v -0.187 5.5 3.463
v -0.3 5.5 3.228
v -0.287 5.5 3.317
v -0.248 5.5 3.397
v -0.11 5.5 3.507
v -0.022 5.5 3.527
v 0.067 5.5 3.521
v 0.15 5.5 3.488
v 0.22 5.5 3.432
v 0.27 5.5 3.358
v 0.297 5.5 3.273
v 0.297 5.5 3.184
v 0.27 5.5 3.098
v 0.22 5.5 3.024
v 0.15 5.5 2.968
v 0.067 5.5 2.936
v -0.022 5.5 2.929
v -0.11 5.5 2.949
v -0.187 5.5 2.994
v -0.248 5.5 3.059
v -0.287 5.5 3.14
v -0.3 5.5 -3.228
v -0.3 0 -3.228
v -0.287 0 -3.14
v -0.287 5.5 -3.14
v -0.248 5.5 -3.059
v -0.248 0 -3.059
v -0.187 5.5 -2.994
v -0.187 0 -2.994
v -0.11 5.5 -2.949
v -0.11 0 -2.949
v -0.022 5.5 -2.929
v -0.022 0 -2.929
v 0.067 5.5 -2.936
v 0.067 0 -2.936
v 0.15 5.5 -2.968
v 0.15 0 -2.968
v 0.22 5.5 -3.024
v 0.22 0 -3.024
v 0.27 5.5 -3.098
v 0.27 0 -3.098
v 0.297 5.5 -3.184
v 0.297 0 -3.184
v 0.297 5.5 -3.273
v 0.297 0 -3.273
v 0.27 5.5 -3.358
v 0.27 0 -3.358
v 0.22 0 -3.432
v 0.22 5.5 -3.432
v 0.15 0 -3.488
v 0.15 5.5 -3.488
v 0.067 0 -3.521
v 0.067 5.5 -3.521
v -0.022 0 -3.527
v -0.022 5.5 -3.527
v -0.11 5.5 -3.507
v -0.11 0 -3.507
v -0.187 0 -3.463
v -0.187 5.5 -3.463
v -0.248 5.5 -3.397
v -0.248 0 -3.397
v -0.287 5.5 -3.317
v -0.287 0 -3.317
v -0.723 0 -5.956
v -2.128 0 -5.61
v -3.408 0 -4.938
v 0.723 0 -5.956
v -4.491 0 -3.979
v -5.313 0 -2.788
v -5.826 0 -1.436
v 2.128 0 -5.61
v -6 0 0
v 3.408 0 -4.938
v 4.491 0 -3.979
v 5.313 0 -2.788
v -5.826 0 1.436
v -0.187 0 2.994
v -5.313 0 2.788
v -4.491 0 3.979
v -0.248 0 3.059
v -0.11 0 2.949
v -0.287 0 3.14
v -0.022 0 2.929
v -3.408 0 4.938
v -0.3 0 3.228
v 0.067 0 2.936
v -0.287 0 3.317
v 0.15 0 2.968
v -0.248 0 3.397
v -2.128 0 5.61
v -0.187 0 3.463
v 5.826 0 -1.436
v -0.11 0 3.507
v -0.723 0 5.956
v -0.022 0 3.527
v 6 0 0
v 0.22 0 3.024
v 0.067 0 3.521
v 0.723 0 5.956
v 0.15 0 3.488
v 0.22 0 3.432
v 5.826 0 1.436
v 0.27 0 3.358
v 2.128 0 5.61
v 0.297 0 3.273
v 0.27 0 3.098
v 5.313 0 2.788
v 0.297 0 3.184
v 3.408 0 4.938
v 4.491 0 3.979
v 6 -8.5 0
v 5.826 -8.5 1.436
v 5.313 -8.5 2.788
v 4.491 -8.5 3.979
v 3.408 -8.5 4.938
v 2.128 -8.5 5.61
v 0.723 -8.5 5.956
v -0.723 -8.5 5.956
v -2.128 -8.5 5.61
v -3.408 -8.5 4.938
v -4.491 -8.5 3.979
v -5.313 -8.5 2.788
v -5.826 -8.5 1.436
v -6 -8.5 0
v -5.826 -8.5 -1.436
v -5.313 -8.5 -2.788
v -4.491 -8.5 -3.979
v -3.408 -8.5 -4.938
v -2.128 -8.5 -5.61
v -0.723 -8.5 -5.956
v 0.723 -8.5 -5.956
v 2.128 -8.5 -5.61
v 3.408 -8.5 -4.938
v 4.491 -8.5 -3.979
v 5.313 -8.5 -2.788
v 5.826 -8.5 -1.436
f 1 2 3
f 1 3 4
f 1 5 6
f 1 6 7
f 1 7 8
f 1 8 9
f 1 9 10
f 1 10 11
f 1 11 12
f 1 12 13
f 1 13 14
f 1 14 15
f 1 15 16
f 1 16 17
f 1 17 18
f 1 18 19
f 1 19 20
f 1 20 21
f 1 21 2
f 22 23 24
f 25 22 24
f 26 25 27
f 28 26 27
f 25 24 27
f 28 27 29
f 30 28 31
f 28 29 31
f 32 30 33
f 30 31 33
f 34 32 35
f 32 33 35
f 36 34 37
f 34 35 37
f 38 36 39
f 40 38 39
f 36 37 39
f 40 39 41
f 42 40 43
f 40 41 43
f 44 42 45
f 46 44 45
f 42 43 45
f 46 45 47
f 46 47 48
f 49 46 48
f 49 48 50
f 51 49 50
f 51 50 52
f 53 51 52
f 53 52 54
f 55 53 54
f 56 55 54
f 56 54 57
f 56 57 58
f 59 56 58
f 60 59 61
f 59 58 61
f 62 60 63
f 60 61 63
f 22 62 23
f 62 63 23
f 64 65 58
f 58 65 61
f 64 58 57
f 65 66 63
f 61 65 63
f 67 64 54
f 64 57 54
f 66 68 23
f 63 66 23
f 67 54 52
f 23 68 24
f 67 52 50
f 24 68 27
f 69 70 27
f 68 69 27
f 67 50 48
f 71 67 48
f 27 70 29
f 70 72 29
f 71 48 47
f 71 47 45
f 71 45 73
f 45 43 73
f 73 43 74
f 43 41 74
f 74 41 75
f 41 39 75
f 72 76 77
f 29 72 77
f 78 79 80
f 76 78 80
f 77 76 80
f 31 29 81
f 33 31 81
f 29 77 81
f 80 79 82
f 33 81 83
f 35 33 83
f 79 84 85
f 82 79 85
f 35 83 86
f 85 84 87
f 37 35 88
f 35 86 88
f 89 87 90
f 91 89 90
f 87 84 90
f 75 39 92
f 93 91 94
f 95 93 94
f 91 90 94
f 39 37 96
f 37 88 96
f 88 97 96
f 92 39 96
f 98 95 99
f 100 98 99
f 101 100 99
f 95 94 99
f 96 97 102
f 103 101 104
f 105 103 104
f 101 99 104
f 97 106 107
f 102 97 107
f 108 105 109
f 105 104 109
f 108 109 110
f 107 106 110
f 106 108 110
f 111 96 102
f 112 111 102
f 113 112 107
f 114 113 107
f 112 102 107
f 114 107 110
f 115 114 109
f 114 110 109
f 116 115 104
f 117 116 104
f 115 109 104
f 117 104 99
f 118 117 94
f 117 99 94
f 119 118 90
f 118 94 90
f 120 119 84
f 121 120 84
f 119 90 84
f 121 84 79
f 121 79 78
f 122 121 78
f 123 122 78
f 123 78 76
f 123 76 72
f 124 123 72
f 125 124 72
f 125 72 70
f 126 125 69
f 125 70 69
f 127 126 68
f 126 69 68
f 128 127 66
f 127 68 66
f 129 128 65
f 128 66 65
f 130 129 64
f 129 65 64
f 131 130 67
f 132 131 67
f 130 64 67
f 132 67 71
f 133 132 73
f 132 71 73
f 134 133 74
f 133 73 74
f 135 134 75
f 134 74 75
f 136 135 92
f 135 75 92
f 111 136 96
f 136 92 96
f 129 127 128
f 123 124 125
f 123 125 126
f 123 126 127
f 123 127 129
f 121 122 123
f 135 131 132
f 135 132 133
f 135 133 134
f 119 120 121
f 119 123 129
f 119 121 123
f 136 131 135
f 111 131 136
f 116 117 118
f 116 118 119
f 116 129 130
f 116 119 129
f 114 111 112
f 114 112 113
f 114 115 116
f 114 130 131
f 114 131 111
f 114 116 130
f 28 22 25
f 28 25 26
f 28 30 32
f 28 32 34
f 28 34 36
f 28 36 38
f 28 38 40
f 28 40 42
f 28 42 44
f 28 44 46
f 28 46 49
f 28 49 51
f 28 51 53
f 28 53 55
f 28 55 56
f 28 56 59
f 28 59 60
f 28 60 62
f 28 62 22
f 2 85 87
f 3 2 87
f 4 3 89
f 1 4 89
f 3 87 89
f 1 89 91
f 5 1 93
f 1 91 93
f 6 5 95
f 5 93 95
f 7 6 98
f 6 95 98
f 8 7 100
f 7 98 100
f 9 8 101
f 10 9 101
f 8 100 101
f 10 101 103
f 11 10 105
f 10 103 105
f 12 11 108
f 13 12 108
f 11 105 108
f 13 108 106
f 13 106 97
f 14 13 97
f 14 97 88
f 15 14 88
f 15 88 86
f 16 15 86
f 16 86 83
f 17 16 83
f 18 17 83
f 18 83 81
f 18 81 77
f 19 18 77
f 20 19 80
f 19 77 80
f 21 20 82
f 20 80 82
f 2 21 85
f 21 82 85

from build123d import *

# Parameters (mm, degrees)
F0_R     = 6
F1_DEPTH = 8.5
F2_R     = 0.3
F3_DEPTH = 5.5


with BuildPart() as f1:
    # F0 (on Front) → F1 (new body)
    with BuildSketch(Plane.XZ):
        Circle(F0_R)
    extrude(amount=F1_DEPTH)

    # F2 (on face) → F3 (join)
    with BuildSketch(Plane(origin=(0, 0, 0), x_dir=(-1, 0, 0), z_dir=(0, 1, 0))):
        with Locations((0, 3.22822)):
            Circle(F2_R)
        with Locations((0, -3.22822)):
            Circle(F2_R)
    extrude(amount=F3_DEPTH)


solid = f1.part
